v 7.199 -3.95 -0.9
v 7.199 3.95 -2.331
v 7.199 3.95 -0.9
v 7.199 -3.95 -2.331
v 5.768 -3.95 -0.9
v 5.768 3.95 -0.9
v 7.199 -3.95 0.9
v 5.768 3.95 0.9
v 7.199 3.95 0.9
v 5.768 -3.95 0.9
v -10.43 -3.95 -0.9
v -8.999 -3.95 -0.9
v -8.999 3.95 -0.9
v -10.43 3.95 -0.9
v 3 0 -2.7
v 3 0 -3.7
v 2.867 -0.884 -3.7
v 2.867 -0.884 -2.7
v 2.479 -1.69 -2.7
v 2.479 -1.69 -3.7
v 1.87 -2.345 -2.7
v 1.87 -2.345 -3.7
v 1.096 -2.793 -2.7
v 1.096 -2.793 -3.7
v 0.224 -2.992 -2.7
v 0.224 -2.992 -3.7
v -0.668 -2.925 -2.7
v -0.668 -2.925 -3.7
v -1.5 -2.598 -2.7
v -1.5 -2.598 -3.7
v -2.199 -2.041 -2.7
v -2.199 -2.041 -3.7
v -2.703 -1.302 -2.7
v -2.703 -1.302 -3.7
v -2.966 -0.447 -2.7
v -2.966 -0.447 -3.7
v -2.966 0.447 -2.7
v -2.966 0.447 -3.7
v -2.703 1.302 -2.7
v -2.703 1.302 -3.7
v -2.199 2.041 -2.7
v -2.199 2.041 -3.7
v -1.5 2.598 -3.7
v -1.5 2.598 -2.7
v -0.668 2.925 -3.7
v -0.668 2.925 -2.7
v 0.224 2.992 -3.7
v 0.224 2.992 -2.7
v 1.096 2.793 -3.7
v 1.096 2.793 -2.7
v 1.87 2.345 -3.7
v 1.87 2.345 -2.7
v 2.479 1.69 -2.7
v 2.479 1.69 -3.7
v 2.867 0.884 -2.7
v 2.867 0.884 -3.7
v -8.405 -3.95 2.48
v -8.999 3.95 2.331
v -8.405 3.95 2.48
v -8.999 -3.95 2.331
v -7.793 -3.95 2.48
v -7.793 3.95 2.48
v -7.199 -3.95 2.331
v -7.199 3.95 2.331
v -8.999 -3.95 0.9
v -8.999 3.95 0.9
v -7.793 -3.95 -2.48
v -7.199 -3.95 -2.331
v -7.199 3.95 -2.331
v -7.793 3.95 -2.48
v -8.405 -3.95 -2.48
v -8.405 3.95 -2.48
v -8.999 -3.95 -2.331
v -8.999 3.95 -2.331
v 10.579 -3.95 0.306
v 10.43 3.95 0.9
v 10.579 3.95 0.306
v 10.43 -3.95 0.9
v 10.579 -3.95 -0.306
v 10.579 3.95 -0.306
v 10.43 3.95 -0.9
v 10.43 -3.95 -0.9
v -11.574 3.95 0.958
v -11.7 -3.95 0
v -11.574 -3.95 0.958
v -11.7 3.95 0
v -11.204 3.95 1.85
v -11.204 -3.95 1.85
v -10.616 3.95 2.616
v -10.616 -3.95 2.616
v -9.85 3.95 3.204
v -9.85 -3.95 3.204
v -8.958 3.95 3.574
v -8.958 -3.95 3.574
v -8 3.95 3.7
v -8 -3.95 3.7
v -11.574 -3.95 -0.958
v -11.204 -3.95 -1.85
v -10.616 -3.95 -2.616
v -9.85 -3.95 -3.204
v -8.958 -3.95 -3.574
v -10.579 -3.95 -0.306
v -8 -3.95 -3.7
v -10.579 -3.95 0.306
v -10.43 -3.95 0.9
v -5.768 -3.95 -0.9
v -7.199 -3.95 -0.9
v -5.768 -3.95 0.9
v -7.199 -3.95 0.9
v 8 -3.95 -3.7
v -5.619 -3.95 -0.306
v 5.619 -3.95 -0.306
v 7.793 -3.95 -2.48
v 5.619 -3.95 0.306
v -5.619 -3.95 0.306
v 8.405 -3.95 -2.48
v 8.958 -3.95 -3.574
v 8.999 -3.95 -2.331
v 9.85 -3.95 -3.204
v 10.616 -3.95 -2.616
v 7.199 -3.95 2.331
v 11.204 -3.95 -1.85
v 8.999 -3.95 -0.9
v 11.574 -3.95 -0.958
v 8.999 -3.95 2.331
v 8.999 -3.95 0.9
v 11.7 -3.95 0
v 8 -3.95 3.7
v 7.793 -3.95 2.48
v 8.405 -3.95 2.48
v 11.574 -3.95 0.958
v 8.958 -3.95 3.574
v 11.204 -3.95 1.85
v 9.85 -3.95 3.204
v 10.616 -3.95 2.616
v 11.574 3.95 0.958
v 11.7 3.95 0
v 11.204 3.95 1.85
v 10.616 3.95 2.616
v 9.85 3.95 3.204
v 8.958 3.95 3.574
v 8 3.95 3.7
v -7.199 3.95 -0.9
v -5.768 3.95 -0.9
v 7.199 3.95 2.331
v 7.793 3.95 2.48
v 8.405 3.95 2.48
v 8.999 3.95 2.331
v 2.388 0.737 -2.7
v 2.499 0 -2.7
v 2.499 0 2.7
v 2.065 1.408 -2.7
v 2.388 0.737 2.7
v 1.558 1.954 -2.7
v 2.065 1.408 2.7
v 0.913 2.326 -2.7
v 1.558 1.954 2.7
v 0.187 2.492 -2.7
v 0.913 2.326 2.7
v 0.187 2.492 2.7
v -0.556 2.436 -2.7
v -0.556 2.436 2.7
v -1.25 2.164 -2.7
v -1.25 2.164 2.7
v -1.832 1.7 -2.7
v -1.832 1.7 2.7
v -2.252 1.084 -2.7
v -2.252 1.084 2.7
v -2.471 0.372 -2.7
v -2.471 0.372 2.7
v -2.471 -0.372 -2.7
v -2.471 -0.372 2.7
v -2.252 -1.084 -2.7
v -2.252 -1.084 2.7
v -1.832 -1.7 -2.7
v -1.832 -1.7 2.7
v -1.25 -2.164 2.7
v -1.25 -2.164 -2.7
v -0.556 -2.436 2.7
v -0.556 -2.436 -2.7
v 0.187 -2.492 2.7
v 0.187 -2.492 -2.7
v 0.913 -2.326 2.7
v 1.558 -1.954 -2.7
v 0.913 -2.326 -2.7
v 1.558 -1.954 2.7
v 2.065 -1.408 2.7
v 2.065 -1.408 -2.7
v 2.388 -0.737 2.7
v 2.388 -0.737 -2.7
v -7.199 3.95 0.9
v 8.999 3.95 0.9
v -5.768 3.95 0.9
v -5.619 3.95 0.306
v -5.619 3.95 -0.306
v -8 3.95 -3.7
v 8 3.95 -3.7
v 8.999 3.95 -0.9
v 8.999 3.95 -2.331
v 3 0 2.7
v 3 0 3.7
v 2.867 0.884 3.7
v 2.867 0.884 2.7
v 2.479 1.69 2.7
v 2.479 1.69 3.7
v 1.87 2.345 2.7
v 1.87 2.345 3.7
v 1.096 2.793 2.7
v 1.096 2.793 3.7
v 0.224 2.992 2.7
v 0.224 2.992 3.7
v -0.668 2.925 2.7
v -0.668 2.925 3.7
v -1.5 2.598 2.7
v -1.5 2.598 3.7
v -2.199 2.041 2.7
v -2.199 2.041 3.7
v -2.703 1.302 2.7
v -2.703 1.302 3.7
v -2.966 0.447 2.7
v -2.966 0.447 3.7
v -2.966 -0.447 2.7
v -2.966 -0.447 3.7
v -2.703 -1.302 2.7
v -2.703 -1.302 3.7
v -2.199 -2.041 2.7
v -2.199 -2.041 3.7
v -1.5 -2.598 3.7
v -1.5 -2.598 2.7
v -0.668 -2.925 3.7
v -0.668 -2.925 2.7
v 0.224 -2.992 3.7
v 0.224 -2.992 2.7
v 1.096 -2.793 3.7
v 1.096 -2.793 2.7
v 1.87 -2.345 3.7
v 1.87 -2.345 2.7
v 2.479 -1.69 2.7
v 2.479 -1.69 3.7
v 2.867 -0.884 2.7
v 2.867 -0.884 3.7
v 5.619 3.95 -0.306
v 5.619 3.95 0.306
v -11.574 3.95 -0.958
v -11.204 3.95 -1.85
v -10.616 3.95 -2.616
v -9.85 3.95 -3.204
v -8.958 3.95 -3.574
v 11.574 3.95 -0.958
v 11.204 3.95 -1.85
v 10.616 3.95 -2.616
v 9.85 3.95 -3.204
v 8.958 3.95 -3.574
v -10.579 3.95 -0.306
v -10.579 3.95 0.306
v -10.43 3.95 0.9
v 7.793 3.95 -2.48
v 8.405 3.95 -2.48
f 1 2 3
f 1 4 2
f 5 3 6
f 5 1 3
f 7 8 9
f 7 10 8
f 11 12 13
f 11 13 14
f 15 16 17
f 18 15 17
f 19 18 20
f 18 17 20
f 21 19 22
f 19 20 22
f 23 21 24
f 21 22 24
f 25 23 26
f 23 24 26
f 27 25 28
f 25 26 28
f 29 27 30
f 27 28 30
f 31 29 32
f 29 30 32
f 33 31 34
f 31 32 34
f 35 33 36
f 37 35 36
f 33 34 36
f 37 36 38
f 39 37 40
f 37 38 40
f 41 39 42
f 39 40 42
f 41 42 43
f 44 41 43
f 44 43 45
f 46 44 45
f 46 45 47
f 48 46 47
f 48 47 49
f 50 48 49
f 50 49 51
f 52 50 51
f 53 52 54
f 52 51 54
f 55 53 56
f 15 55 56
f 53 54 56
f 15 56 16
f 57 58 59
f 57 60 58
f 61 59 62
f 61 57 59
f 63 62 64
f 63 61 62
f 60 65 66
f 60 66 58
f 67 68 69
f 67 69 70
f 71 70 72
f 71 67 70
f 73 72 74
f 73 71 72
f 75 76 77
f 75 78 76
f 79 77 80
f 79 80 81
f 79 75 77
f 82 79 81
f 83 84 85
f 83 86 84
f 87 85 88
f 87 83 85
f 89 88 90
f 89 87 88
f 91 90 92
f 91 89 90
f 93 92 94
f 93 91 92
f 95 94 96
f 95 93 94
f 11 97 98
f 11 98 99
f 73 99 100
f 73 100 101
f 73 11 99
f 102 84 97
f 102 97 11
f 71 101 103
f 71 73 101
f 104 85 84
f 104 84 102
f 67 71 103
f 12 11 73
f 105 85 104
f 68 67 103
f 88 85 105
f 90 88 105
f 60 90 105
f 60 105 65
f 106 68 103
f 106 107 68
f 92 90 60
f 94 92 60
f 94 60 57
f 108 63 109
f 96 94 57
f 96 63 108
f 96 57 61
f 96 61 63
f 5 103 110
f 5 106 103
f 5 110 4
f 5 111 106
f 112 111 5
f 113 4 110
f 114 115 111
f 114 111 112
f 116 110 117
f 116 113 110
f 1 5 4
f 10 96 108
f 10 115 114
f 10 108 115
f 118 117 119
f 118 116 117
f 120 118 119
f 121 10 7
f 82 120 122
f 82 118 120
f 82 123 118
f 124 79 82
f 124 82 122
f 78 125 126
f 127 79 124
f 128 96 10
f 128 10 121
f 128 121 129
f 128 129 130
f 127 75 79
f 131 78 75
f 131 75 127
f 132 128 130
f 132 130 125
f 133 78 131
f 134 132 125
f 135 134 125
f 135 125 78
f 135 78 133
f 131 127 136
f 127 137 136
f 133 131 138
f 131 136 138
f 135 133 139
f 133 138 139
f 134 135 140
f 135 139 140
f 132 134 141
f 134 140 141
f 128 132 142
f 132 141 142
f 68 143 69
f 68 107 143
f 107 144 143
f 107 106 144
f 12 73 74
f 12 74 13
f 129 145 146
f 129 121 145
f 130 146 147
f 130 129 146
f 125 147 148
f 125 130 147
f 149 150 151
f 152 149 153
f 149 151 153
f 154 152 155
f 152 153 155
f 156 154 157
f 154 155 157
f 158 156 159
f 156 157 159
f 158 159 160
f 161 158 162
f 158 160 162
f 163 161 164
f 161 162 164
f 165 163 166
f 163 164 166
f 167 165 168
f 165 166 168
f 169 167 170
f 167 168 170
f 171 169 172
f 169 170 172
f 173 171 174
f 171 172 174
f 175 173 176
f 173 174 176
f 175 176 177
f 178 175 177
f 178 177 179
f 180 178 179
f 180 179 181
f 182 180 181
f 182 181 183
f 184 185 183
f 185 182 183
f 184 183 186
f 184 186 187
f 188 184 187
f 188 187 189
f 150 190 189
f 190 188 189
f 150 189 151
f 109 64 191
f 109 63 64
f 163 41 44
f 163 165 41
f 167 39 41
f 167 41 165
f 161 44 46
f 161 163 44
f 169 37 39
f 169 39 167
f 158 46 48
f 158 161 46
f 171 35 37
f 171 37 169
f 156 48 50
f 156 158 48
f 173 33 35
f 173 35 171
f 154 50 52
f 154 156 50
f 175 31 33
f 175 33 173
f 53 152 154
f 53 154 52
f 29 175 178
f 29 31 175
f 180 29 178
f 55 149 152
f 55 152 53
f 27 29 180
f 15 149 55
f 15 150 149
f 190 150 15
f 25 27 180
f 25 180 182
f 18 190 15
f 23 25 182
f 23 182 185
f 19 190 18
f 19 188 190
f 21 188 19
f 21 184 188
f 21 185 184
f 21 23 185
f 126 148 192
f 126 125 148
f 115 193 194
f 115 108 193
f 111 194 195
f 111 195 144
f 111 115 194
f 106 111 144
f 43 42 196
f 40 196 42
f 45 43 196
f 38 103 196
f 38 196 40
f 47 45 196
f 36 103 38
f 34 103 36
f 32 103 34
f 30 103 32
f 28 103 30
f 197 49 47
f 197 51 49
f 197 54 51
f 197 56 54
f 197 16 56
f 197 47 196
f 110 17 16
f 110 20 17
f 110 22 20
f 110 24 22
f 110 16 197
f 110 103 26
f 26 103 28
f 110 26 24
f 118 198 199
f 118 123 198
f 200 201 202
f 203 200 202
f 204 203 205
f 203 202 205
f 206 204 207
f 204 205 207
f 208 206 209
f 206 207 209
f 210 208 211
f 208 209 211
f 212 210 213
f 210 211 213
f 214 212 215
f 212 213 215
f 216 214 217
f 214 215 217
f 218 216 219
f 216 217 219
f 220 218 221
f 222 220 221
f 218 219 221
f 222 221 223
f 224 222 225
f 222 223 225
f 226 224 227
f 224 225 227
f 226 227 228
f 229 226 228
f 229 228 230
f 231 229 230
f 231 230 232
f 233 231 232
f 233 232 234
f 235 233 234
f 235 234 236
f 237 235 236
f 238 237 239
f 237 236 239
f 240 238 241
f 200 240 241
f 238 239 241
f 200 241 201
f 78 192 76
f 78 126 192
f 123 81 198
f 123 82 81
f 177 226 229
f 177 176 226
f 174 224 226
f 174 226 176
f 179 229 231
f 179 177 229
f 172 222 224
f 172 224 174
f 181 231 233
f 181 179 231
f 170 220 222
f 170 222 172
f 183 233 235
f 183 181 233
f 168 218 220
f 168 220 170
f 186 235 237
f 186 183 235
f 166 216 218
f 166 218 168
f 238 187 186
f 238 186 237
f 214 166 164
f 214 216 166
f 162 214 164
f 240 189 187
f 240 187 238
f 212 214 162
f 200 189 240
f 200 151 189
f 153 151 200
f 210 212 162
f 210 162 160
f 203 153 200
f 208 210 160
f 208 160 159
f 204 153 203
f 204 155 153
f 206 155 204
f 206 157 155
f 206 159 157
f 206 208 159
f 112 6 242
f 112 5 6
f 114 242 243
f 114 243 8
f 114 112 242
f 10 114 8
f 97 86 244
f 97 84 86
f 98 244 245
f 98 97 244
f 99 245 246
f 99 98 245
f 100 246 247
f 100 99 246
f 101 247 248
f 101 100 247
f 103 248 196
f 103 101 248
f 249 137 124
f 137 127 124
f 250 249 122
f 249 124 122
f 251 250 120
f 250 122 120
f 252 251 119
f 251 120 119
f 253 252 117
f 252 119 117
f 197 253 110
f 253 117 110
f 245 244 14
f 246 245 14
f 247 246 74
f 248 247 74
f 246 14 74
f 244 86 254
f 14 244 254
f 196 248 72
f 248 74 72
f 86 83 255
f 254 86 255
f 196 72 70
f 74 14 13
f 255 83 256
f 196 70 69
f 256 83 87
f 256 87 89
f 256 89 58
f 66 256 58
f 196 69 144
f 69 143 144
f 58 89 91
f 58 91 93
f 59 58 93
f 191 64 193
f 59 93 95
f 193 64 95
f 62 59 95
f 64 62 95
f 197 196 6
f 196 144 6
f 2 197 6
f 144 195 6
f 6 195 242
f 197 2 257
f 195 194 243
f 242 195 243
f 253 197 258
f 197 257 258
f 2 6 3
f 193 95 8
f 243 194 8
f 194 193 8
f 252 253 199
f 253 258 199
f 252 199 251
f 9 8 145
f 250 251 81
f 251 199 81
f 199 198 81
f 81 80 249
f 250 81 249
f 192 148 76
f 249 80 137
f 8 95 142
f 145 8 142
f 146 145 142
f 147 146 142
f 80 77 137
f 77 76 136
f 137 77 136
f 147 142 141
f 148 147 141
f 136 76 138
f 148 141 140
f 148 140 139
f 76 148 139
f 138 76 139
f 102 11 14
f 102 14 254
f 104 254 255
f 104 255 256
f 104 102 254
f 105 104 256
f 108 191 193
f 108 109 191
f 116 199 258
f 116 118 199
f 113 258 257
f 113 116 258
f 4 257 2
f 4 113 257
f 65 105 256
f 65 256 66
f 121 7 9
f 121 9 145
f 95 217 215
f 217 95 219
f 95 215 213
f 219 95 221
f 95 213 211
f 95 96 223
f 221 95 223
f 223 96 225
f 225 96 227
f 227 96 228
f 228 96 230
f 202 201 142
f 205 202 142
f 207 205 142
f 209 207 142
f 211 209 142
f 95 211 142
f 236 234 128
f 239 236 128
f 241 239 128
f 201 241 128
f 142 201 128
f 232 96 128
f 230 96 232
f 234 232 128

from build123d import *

# Parameters (mm, degrees)
F0_W     = 23.4
F0_H     = 7.4
F1_DEPTH = 3.95
F2_R     = 3.69999
F3_R     = 2.499
F4_DEPTH = 25
F3_R_2   = 3
F5_DEPTH = 1
F6_R     = 3
F6_R_2   = 2.499
F7_DEPTH = 1


# Not quite as in the source:
# - a fillet or chamfer is up to 0.001 mm smaller than in the source, because OpenCascade refuses the exact size


with BuildPart() as f1:
    # F0 (on Front) → F1 (new body, symmetric)
    with BuildSketch(Plane.XZ):
        Rectangle(F0_W, F0_H)
        with BuildLine():
            ThreePointArc((-7.199, -2.3313088598), (-8.099, -2.499), (-8.999, -2.3313088598))
            Line((-8.999, -2.3313088598), (-8.999, -0.9))
            Line((-8.999, -0.9), (-10.4303088598, -0.9))
            ThreePointArc((-10.4303088598, -0.9), (-10.598, 0), (-10.4303088598, 0.9))
            Line((-10.4303088598, 0.9), (-8.999, 0.9))
            Line((-8.999, 0.9), (-8.999, 2.3313088598))
            ThreePointArc((-8.999, 2.3313088598), (-8.099, 2.499), (-7.199, 2.3313088598))
            Line((-7.199, 2.3313088598), (-7.199, 0.9))
            Line((-7.199, 0.9), (-5.7676911402, 0.9))
            ThreePointArc((-5.7676911402, 0.9), (-5.6, 0), (-5.7676911402, -0.9))
            Line((-5.7676911402, -0.9), (-7.199, -0.9))
            Line((-7.199, -0.9), (-7.199, -2.3313088598))
        make_face(mode=Mode.SUBTRACT)
        with BuildLine():
            Line((7.199, 0.9), (7.199, 2.3313088598))
            ThreePointArc((7.199, 2.3313088598), (8.099, 2.499), (8.999, 2.3313088598))
            Line((8.999, 2.3313088598), (8.999, 0.9))
            Line((8.999, 0.9), (10.4303088598, 0.9))
            ThreePointArc((10.4303088598, 0.9), (10.598, 0), (10.4303088598, -0.9))
            Line((10.4303088598, -0.9), (8.999, -0.9))
            Line((8.999, -0.9), (8.999, -2.3313088598))
            ThreePointArc((8.999, -2.3313088598), (8.099, -2.499), (7.199, -2.3313088598))
            Line((7.199, -2.3313088598), (7.199, -0.9))
            Line((7.199, -0.9), (5.7676911402, -0.9))
            ThreePointArc((5.7676911402, -0.9), (5.6, 0), (5.7676911402, 0.9))
            Line((5.7676911402, 0.9), (7.199, 0.9))
        make_face(mode=Mode.SUBTRACT)
    extrude(amount=F1_DEPTH, both=True)

    # F2 (radius 3.7 in the source; OpenCascade refuses exactly that, so slightly less here)
    f2_edges = [f1.edges().sort_by_distance(p)[0] for p in [
        (-11.7, 0, -3.7),
        (-11.7, 0, 3.7),
        (11.7, 0, 3.7),
        (11.7, 0, -3.7),
    ]]
    fillet(f2_edges, radius=F2_R)

    # F3 (on face) → F4 (cut)
    with BuildSketch(Plane.XY.offset(3.7)):
        Circle(F3_R)
    extrude(amount=-F4_DEPTH, mode=Mode.SUBTRACT)

    # F3 (on face) → F5 (cut)
    with BuildSketch(Plane.XY.offset(3.7)):
        Circle(F3_R_2)
        Circle(F3_R, mode=Mode.SUBTRACT)
    extrude(amount=-F5_DEPTH, mode=Mode.SUBTRACT)

    # F6 (on face) → F7 (cut)
    with BuildSketch(Plane(origin=(0, 0, -3.7), x_dir=(1, 0, 0), z_dir=(0, 0, -1))):
        Circle(F6_R)
        Circle(F6_R_2, mode=Mode.SUBTRACT)
    extrude(amount=-F7_DEPTH, mode=Mode.SUBTRACT)


solid = f1.part
